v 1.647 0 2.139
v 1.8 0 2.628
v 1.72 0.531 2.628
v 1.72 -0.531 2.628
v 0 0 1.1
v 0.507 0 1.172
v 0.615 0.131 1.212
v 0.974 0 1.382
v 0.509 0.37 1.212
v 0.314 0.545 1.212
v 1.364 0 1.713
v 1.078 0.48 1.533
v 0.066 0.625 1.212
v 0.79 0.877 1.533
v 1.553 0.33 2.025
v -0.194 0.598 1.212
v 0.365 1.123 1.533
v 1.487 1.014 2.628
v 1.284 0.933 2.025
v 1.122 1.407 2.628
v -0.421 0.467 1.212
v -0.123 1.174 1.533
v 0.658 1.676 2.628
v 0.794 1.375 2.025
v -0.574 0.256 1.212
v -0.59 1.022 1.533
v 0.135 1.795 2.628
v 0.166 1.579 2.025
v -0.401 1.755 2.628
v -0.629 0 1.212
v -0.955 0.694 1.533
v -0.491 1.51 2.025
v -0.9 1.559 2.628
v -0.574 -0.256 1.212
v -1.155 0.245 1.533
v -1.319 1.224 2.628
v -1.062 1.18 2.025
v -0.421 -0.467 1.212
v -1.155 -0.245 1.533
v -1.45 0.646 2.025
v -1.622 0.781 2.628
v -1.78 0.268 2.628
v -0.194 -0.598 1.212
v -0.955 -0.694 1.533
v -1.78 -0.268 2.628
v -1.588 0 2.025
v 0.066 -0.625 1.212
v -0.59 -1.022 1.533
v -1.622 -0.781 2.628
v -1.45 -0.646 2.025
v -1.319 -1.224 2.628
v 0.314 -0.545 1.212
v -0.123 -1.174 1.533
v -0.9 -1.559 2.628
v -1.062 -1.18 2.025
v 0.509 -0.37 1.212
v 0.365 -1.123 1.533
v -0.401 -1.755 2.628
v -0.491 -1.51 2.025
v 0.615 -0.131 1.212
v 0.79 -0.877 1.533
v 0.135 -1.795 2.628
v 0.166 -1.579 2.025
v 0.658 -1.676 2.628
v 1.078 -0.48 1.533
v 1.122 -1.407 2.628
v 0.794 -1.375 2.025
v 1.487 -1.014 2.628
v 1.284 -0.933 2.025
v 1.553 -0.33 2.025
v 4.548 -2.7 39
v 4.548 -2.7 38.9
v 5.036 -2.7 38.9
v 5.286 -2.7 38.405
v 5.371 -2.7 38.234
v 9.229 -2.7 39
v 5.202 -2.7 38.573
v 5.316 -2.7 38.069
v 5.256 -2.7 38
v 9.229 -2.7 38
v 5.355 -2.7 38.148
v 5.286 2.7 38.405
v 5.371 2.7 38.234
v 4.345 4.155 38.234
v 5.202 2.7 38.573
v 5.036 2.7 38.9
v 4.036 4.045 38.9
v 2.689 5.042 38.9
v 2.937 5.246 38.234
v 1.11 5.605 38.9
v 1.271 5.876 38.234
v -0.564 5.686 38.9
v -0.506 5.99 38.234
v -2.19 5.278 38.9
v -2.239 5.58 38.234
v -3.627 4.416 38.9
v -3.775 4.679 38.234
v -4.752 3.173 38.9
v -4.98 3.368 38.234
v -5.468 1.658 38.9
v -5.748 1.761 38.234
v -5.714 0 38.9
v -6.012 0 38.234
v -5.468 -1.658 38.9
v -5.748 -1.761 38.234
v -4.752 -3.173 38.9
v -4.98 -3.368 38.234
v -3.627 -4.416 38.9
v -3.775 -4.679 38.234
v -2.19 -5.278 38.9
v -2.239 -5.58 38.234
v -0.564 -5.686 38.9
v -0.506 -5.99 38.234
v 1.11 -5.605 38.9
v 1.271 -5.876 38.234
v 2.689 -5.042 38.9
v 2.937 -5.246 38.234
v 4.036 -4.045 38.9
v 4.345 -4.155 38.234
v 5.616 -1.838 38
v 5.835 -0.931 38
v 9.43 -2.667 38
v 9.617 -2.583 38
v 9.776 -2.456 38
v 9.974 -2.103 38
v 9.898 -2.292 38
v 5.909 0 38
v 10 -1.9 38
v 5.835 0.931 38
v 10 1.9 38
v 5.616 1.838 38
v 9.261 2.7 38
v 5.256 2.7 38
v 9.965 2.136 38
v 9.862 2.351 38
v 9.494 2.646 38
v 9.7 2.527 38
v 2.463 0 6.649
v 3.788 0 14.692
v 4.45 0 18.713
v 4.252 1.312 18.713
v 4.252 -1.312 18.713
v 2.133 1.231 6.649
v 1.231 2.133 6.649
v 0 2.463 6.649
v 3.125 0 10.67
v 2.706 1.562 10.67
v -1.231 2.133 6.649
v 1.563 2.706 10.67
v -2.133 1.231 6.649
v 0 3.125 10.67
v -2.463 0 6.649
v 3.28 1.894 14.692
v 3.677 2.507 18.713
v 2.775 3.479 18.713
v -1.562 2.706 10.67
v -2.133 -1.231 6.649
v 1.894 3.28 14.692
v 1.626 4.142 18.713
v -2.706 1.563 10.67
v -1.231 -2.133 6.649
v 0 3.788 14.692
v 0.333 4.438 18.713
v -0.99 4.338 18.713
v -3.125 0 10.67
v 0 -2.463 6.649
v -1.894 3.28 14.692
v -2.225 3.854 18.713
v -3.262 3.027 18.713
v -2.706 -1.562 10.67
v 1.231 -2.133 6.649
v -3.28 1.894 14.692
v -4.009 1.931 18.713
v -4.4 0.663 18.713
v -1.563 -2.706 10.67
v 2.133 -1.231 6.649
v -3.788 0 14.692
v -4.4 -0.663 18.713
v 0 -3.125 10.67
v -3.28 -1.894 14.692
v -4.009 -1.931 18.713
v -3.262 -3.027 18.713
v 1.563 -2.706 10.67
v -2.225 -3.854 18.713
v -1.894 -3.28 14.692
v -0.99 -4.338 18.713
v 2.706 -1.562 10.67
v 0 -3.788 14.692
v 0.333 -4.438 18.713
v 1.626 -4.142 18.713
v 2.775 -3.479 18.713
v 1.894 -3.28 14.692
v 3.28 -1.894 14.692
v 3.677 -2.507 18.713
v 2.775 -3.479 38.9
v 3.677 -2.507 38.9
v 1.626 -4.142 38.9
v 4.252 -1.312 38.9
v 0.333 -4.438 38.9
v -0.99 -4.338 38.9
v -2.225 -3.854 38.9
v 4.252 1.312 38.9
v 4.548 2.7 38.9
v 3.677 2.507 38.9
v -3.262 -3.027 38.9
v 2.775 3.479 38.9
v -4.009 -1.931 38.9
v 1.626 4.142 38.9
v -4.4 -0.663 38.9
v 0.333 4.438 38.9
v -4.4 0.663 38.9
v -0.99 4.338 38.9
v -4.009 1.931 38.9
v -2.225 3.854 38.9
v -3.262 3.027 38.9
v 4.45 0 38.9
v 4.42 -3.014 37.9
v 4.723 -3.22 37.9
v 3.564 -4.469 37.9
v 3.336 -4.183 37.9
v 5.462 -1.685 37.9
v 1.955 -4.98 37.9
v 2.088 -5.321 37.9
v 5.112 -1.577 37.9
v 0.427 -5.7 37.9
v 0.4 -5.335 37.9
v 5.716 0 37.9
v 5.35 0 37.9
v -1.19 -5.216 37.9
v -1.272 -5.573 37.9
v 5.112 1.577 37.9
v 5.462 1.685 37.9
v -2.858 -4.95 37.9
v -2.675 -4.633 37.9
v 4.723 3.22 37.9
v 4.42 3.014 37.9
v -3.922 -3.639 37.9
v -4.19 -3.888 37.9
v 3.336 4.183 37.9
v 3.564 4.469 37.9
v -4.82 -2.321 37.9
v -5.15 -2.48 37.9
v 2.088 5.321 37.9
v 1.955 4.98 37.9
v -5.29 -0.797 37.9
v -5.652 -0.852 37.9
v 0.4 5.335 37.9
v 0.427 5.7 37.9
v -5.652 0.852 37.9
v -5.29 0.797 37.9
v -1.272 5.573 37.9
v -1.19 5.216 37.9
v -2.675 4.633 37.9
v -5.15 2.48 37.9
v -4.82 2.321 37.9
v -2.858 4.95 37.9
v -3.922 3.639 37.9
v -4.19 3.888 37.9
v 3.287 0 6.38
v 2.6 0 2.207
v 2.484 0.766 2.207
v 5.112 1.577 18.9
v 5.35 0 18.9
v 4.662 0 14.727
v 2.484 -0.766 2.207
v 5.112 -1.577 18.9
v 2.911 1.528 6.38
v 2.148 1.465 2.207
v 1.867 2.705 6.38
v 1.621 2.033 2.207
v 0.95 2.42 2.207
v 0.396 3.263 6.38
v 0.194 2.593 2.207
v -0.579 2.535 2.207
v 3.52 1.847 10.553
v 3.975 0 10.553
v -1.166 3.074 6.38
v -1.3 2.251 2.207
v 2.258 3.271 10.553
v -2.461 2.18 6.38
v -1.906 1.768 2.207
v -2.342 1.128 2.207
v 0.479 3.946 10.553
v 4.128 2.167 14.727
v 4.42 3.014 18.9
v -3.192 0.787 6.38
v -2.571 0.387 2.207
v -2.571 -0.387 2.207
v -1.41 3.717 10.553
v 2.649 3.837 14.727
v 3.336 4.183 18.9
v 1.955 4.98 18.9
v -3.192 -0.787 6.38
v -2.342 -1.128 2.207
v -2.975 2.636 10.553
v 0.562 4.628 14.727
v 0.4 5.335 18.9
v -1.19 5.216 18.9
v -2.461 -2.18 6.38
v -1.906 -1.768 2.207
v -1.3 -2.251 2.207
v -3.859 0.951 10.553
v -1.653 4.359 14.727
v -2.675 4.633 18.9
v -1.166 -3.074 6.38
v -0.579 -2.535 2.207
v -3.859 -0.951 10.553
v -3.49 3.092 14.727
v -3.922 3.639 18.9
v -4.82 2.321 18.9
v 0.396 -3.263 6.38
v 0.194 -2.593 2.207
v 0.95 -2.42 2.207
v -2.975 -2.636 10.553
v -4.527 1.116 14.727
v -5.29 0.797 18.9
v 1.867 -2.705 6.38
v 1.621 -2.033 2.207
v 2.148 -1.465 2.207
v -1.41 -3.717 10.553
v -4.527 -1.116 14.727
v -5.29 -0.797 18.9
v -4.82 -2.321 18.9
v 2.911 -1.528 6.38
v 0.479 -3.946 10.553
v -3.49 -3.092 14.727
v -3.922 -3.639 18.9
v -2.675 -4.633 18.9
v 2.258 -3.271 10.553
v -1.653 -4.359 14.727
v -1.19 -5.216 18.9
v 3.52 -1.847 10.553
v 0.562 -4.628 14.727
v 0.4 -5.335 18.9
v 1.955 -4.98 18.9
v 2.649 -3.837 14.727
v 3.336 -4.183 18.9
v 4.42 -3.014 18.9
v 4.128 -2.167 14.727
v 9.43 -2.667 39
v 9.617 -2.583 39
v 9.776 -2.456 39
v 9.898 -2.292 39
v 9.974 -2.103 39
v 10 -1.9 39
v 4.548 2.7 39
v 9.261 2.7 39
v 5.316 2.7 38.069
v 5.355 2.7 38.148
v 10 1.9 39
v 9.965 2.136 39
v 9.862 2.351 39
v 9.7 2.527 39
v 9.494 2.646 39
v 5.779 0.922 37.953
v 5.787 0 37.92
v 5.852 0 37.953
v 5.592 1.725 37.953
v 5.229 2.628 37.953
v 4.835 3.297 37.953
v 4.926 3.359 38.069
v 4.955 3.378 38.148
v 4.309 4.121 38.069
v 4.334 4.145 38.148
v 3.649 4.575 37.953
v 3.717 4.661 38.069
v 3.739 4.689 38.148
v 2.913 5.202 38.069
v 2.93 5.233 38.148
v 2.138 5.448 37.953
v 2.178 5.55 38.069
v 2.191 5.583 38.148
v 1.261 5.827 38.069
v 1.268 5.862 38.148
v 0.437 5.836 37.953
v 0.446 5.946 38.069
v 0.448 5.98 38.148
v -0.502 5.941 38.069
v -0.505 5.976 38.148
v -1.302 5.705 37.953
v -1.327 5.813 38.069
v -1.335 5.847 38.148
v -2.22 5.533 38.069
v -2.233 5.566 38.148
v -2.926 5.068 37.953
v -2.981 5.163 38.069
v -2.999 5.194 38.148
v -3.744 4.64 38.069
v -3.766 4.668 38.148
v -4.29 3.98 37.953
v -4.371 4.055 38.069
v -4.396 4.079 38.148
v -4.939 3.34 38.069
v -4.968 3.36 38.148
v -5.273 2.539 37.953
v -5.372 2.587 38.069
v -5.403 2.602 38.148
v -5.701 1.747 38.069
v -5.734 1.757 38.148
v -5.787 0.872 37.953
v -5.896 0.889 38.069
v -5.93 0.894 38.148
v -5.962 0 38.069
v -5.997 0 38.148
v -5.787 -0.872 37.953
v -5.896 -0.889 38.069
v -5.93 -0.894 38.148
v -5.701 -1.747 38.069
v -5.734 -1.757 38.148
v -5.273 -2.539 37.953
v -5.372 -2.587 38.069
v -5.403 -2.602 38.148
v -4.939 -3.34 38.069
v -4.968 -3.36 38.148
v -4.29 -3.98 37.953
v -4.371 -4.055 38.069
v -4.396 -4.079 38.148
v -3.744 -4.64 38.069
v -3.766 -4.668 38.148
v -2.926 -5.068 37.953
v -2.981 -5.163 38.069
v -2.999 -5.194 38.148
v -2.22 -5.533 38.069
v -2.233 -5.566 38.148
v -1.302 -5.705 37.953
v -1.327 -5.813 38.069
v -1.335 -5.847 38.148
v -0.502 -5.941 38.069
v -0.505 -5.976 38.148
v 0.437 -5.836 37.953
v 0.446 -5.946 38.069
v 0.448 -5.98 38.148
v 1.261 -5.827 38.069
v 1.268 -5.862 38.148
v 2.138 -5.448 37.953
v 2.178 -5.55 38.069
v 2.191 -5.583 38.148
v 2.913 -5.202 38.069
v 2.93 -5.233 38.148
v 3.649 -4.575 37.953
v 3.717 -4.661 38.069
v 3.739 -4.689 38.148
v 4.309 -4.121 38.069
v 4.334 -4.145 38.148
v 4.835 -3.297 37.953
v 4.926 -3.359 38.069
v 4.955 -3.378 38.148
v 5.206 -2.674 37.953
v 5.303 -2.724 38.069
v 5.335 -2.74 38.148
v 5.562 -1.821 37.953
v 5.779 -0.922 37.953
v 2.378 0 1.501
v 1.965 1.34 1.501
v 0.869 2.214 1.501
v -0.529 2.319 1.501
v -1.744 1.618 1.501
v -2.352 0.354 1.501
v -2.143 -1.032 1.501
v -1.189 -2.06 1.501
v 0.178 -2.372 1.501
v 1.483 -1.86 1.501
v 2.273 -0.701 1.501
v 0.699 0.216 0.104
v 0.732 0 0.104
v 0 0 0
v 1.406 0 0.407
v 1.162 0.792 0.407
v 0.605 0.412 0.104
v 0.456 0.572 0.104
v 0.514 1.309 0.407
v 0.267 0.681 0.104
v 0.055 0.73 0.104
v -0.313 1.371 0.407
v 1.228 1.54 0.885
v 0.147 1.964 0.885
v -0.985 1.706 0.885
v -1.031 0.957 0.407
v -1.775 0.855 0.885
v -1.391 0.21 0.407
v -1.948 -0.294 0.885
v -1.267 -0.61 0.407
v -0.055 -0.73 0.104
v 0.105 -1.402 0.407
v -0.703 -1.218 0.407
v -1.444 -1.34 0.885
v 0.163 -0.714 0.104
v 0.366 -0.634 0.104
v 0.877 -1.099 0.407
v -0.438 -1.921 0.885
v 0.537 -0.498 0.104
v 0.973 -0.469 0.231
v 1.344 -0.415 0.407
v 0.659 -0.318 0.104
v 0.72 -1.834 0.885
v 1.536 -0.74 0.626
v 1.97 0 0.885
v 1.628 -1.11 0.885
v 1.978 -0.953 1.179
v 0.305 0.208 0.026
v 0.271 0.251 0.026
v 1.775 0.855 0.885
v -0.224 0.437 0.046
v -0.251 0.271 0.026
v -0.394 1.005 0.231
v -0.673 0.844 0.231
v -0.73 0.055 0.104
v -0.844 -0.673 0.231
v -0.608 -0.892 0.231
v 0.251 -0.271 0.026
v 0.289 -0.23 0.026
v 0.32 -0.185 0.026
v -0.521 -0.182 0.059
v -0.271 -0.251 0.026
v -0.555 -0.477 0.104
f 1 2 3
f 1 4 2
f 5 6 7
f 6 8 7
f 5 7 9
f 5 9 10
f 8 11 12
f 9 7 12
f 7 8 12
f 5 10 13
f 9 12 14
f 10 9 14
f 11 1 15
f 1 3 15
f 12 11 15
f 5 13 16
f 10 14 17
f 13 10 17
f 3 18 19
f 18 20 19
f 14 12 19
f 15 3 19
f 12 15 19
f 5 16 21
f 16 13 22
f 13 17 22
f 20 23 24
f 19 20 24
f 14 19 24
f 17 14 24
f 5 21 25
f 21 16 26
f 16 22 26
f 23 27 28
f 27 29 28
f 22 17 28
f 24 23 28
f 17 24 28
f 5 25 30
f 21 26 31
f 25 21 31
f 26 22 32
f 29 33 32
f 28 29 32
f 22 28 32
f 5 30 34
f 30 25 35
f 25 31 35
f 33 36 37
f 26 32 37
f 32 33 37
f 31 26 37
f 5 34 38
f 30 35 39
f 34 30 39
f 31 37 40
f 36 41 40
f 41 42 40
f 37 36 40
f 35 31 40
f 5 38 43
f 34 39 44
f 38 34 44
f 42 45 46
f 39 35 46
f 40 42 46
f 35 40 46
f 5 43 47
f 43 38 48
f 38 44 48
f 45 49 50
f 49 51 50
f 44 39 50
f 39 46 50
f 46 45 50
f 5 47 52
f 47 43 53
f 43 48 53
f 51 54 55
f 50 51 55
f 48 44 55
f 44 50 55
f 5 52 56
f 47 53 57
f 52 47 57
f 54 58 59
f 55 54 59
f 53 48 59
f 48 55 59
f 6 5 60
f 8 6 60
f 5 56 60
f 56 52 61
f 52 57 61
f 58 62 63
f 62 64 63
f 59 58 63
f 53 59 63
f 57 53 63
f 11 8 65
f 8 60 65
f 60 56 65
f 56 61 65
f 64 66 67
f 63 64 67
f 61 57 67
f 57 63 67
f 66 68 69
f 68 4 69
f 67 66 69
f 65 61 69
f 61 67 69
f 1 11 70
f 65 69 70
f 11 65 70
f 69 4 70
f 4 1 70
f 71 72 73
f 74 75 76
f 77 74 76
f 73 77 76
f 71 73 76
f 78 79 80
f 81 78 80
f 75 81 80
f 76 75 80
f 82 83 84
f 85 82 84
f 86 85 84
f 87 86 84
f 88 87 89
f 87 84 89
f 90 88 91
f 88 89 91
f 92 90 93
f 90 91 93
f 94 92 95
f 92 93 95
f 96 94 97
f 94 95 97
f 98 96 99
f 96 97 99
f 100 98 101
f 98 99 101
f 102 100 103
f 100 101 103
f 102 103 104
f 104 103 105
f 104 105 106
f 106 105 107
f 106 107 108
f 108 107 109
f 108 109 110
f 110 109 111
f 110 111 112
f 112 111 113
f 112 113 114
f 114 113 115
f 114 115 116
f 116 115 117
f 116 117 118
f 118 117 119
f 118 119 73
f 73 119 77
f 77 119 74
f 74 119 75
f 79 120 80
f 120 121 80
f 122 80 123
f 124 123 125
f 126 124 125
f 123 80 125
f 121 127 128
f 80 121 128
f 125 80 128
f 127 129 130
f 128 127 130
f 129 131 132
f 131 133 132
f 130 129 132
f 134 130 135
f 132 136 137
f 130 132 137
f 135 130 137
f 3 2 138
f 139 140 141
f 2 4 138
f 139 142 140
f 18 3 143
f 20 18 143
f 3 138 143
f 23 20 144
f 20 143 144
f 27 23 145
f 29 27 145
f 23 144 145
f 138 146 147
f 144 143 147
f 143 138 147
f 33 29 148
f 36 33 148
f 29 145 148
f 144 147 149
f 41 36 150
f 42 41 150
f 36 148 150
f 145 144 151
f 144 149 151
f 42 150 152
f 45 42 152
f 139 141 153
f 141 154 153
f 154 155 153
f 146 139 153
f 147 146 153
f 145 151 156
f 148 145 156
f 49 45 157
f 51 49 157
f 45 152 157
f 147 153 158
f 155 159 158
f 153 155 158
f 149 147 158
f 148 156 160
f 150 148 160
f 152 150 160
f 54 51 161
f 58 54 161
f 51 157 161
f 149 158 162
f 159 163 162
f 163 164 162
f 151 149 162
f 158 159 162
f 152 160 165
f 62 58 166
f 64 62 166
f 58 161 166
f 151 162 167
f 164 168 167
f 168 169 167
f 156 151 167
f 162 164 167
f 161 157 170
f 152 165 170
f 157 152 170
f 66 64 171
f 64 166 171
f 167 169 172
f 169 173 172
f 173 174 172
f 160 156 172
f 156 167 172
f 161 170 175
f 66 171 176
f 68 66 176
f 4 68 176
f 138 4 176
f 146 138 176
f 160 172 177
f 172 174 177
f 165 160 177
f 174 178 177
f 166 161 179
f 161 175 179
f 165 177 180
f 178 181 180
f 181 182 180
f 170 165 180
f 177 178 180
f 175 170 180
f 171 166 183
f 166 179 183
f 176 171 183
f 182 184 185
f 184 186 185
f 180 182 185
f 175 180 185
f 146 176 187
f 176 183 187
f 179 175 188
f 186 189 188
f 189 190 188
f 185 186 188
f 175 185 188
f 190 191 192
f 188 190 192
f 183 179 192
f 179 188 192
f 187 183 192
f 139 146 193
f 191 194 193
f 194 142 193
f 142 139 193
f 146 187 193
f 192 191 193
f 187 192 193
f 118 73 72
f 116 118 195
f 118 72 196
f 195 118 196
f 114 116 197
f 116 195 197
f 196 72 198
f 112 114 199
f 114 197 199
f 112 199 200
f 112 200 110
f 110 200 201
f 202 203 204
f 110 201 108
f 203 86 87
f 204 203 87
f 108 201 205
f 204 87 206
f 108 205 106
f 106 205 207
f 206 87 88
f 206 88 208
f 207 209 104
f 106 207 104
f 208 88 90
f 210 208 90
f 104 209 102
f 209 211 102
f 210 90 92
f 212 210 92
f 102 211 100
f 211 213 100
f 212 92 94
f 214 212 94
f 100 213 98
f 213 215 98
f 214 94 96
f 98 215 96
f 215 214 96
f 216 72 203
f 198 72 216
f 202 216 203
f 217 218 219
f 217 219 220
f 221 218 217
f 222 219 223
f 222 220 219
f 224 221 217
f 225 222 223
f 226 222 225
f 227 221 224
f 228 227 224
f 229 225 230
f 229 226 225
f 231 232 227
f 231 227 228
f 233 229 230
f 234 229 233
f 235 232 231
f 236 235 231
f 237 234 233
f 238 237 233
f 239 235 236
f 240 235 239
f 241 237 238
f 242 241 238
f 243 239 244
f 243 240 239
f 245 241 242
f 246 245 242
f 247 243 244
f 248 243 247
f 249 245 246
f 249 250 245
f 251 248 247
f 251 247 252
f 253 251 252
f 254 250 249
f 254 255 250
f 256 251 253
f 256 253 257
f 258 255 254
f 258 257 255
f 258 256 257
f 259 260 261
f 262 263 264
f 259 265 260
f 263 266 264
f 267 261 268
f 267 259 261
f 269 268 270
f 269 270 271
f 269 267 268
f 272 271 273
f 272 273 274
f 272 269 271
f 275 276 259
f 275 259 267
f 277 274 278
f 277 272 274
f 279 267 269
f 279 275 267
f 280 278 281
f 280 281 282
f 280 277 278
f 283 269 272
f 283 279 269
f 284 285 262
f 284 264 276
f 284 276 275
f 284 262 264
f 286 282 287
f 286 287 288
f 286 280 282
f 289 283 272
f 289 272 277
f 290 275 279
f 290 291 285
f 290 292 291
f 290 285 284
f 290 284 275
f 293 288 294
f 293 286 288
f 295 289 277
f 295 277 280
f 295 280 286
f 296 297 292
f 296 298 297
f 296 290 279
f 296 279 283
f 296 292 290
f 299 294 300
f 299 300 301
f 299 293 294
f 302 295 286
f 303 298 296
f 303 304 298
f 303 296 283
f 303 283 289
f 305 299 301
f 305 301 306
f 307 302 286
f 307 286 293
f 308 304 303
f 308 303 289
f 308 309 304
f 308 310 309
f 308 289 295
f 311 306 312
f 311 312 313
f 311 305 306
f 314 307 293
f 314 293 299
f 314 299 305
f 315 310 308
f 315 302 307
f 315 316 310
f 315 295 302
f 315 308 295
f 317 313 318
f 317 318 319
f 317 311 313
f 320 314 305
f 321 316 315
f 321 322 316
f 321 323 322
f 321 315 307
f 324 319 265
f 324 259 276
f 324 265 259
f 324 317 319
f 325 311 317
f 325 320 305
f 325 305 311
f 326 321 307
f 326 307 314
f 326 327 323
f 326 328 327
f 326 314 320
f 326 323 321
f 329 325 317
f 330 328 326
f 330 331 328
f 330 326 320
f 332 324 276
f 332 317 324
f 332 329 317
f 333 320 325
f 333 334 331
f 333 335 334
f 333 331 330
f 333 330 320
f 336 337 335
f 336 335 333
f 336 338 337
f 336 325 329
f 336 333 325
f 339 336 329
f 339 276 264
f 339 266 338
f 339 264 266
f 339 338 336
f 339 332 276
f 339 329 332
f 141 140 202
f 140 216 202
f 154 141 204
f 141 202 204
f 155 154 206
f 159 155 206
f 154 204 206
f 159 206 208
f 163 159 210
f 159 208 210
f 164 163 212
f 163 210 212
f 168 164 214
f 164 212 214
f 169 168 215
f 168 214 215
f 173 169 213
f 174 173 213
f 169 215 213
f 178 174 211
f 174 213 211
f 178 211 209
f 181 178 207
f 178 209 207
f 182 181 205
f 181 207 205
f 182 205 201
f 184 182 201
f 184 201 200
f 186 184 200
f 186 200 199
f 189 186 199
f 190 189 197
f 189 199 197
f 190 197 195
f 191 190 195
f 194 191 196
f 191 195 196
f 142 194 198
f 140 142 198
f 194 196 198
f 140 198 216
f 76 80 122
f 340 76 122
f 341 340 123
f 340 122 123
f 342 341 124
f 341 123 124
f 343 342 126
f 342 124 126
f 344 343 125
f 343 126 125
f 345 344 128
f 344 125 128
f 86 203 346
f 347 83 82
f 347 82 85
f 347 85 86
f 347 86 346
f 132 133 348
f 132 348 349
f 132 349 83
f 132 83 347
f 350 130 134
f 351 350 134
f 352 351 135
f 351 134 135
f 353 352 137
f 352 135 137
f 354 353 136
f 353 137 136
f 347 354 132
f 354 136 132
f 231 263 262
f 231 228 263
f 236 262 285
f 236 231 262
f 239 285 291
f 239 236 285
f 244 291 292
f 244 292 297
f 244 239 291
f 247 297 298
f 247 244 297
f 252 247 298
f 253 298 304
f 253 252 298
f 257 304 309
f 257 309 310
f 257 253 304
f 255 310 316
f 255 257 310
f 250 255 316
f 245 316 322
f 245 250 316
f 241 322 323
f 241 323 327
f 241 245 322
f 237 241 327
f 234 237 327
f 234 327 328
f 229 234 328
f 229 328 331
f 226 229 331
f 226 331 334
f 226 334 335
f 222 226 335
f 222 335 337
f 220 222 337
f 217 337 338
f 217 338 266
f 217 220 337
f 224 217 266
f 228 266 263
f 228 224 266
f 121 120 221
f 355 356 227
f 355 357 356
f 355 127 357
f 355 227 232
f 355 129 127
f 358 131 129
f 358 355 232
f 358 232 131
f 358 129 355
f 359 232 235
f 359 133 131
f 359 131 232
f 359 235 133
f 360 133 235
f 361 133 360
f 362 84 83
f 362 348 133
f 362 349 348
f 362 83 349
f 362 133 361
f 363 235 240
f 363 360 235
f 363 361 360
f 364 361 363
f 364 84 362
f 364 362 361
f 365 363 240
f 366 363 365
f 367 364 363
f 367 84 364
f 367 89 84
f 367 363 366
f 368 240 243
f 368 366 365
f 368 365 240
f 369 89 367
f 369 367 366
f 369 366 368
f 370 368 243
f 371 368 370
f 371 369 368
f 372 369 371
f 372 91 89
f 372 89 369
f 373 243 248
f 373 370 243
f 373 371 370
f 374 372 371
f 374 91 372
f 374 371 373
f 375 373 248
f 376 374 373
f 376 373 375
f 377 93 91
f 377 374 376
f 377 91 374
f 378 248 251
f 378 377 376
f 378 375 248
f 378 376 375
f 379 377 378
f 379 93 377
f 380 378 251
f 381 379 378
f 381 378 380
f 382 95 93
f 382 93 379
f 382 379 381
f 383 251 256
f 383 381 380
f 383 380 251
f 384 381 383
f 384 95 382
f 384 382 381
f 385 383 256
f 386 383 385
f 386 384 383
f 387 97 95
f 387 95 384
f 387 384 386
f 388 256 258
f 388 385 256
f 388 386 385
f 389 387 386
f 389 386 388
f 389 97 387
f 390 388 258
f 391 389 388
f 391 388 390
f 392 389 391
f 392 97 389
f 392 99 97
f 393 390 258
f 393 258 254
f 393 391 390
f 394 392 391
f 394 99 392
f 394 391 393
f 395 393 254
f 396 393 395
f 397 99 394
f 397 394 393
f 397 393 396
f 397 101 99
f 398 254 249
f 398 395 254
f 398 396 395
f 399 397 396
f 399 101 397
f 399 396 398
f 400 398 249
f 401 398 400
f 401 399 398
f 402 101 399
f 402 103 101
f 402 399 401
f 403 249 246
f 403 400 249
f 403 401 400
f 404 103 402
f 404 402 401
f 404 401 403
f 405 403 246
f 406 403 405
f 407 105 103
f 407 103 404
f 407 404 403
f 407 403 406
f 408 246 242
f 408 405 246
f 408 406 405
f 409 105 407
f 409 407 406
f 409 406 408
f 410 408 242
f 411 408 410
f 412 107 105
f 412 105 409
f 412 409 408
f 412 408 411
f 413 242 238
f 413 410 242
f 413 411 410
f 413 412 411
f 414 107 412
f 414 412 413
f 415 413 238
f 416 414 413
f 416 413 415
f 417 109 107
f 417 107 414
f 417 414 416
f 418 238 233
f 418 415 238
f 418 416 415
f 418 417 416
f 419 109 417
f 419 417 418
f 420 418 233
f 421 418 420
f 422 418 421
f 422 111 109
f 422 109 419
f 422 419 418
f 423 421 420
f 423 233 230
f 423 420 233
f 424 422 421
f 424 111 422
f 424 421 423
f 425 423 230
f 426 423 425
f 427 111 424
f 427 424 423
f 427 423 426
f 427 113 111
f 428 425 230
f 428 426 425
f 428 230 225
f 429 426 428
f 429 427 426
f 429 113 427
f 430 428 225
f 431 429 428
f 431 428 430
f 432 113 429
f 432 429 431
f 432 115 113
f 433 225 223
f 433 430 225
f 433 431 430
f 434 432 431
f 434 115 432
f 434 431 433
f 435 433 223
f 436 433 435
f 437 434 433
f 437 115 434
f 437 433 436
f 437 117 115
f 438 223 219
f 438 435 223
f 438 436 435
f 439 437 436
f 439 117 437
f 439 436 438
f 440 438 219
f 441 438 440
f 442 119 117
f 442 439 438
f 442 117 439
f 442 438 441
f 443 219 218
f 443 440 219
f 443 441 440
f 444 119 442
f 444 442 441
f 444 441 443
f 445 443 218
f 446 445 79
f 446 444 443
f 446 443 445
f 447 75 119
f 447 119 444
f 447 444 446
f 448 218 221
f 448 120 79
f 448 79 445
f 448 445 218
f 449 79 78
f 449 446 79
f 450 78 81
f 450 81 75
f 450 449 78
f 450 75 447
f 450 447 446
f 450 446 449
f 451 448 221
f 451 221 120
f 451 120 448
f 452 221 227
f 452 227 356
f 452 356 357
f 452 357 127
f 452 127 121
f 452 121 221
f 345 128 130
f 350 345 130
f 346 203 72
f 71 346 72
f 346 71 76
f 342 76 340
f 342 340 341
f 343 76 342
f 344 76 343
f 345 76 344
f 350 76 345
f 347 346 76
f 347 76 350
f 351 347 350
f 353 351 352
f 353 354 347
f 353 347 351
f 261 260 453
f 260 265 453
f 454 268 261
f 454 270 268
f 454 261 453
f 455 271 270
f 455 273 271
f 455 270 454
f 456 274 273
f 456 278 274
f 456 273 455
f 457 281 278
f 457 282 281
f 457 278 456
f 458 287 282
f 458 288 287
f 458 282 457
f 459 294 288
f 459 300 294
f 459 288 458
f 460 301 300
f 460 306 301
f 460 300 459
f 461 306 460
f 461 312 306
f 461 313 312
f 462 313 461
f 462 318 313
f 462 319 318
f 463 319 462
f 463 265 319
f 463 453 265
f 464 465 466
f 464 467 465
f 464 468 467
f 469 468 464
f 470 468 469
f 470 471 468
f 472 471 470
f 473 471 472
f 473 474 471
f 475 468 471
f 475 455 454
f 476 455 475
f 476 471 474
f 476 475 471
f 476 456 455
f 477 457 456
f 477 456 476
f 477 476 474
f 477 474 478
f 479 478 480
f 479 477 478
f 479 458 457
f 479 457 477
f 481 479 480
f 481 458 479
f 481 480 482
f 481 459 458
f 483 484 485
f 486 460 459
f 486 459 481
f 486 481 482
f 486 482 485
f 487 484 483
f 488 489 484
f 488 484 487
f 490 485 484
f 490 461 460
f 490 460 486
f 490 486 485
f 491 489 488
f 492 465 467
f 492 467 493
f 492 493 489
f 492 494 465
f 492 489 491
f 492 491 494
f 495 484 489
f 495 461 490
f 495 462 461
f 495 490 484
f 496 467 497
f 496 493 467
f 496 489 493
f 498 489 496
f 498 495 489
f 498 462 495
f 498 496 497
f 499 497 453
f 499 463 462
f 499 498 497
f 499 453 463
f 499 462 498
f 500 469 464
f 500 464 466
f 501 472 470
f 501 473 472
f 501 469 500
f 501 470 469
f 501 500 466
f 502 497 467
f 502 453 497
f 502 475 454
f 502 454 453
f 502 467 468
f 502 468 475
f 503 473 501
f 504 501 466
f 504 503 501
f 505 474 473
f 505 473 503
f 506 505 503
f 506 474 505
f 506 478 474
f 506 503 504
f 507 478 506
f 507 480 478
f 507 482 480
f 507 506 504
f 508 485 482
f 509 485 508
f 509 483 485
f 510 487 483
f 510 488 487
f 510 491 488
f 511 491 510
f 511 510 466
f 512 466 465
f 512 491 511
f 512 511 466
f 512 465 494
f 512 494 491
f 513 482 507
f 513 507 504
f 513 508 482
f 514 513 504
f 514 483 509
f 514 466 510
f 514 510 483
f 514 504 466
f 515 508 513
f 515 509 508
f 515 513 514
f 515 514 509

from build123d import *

# Parameters (mm, degrees)
PAD001_DEPTH = 1


with BuildPart() as hinge:
    # Sketch003 → Pad001 (new body)
    with BuildSketch(Plane.XY):
        with BuildLine():
            Line((10, 0), (10, 1.9))
            ThreePointArc((10, 1.9), (9.787661, 2.445156), (9.261032, 2.7))
            Line((4.547651, 2.7), (9.261032, 2.7))
            Line((4.547651, 0), (4.547651, 2.7))
            Line((4.547651, 0), (4.547651, -2.7))
            Line((4.547651, -2.7), (9.228747, -2.7))
            ThreePointArc((9.228747, -2.7), (9.775939, -2.45576), (10, -1.9))
            Line((10, 0), (10, -1.9))
        make_face()
    extrude(amount=PAD001_DEPTH)


with BuildPart() as hinge_1:
    # Body003 placement: moved
    add(hinge.part.moved(Location((0, 0, 38))))


with BuildPart() as body_w_hinge:
    # Sketch001 → Revolution (revolve)
    with BuildSketch(Plane.XZ):
        with BuildLine():
            Line((0, 0), (0, 1.1))
            ThreePointArc((0, 1.1), (1.180458, 1.533416), (1.8, 2.627718))
            Line((1.8, 2.627718), (4.45, 18.712917))
            Line((4.45, 18.712917), (4.45, 38.9))
            Line((4.45, 38.9), (5.714157, 38.9))
            Line((5.714157, 38.9), (6.011811, 38.234338))
            ThreePointArc((5.716101, 37.9), (5.923028, 38.014921), (6.011811, 38.234338))
            Line((5.35, 37.9), (5.716101, 37.9))
            Line((5.35, 18.9), (5.35, 37.9))
            Line((2.599788, 2.206524), (5.35, 18.9))
            ThreePointArc((0, 0), (1.704967, 0.625994), (2.599788, 2.206524))
        make_face()
    revolve(axis=Axis((0, 0, 0), (0, 0, 1)))

    # Fusion: union Hinge
    add(hinge_1.part)


solid = body_w_hinge.part
